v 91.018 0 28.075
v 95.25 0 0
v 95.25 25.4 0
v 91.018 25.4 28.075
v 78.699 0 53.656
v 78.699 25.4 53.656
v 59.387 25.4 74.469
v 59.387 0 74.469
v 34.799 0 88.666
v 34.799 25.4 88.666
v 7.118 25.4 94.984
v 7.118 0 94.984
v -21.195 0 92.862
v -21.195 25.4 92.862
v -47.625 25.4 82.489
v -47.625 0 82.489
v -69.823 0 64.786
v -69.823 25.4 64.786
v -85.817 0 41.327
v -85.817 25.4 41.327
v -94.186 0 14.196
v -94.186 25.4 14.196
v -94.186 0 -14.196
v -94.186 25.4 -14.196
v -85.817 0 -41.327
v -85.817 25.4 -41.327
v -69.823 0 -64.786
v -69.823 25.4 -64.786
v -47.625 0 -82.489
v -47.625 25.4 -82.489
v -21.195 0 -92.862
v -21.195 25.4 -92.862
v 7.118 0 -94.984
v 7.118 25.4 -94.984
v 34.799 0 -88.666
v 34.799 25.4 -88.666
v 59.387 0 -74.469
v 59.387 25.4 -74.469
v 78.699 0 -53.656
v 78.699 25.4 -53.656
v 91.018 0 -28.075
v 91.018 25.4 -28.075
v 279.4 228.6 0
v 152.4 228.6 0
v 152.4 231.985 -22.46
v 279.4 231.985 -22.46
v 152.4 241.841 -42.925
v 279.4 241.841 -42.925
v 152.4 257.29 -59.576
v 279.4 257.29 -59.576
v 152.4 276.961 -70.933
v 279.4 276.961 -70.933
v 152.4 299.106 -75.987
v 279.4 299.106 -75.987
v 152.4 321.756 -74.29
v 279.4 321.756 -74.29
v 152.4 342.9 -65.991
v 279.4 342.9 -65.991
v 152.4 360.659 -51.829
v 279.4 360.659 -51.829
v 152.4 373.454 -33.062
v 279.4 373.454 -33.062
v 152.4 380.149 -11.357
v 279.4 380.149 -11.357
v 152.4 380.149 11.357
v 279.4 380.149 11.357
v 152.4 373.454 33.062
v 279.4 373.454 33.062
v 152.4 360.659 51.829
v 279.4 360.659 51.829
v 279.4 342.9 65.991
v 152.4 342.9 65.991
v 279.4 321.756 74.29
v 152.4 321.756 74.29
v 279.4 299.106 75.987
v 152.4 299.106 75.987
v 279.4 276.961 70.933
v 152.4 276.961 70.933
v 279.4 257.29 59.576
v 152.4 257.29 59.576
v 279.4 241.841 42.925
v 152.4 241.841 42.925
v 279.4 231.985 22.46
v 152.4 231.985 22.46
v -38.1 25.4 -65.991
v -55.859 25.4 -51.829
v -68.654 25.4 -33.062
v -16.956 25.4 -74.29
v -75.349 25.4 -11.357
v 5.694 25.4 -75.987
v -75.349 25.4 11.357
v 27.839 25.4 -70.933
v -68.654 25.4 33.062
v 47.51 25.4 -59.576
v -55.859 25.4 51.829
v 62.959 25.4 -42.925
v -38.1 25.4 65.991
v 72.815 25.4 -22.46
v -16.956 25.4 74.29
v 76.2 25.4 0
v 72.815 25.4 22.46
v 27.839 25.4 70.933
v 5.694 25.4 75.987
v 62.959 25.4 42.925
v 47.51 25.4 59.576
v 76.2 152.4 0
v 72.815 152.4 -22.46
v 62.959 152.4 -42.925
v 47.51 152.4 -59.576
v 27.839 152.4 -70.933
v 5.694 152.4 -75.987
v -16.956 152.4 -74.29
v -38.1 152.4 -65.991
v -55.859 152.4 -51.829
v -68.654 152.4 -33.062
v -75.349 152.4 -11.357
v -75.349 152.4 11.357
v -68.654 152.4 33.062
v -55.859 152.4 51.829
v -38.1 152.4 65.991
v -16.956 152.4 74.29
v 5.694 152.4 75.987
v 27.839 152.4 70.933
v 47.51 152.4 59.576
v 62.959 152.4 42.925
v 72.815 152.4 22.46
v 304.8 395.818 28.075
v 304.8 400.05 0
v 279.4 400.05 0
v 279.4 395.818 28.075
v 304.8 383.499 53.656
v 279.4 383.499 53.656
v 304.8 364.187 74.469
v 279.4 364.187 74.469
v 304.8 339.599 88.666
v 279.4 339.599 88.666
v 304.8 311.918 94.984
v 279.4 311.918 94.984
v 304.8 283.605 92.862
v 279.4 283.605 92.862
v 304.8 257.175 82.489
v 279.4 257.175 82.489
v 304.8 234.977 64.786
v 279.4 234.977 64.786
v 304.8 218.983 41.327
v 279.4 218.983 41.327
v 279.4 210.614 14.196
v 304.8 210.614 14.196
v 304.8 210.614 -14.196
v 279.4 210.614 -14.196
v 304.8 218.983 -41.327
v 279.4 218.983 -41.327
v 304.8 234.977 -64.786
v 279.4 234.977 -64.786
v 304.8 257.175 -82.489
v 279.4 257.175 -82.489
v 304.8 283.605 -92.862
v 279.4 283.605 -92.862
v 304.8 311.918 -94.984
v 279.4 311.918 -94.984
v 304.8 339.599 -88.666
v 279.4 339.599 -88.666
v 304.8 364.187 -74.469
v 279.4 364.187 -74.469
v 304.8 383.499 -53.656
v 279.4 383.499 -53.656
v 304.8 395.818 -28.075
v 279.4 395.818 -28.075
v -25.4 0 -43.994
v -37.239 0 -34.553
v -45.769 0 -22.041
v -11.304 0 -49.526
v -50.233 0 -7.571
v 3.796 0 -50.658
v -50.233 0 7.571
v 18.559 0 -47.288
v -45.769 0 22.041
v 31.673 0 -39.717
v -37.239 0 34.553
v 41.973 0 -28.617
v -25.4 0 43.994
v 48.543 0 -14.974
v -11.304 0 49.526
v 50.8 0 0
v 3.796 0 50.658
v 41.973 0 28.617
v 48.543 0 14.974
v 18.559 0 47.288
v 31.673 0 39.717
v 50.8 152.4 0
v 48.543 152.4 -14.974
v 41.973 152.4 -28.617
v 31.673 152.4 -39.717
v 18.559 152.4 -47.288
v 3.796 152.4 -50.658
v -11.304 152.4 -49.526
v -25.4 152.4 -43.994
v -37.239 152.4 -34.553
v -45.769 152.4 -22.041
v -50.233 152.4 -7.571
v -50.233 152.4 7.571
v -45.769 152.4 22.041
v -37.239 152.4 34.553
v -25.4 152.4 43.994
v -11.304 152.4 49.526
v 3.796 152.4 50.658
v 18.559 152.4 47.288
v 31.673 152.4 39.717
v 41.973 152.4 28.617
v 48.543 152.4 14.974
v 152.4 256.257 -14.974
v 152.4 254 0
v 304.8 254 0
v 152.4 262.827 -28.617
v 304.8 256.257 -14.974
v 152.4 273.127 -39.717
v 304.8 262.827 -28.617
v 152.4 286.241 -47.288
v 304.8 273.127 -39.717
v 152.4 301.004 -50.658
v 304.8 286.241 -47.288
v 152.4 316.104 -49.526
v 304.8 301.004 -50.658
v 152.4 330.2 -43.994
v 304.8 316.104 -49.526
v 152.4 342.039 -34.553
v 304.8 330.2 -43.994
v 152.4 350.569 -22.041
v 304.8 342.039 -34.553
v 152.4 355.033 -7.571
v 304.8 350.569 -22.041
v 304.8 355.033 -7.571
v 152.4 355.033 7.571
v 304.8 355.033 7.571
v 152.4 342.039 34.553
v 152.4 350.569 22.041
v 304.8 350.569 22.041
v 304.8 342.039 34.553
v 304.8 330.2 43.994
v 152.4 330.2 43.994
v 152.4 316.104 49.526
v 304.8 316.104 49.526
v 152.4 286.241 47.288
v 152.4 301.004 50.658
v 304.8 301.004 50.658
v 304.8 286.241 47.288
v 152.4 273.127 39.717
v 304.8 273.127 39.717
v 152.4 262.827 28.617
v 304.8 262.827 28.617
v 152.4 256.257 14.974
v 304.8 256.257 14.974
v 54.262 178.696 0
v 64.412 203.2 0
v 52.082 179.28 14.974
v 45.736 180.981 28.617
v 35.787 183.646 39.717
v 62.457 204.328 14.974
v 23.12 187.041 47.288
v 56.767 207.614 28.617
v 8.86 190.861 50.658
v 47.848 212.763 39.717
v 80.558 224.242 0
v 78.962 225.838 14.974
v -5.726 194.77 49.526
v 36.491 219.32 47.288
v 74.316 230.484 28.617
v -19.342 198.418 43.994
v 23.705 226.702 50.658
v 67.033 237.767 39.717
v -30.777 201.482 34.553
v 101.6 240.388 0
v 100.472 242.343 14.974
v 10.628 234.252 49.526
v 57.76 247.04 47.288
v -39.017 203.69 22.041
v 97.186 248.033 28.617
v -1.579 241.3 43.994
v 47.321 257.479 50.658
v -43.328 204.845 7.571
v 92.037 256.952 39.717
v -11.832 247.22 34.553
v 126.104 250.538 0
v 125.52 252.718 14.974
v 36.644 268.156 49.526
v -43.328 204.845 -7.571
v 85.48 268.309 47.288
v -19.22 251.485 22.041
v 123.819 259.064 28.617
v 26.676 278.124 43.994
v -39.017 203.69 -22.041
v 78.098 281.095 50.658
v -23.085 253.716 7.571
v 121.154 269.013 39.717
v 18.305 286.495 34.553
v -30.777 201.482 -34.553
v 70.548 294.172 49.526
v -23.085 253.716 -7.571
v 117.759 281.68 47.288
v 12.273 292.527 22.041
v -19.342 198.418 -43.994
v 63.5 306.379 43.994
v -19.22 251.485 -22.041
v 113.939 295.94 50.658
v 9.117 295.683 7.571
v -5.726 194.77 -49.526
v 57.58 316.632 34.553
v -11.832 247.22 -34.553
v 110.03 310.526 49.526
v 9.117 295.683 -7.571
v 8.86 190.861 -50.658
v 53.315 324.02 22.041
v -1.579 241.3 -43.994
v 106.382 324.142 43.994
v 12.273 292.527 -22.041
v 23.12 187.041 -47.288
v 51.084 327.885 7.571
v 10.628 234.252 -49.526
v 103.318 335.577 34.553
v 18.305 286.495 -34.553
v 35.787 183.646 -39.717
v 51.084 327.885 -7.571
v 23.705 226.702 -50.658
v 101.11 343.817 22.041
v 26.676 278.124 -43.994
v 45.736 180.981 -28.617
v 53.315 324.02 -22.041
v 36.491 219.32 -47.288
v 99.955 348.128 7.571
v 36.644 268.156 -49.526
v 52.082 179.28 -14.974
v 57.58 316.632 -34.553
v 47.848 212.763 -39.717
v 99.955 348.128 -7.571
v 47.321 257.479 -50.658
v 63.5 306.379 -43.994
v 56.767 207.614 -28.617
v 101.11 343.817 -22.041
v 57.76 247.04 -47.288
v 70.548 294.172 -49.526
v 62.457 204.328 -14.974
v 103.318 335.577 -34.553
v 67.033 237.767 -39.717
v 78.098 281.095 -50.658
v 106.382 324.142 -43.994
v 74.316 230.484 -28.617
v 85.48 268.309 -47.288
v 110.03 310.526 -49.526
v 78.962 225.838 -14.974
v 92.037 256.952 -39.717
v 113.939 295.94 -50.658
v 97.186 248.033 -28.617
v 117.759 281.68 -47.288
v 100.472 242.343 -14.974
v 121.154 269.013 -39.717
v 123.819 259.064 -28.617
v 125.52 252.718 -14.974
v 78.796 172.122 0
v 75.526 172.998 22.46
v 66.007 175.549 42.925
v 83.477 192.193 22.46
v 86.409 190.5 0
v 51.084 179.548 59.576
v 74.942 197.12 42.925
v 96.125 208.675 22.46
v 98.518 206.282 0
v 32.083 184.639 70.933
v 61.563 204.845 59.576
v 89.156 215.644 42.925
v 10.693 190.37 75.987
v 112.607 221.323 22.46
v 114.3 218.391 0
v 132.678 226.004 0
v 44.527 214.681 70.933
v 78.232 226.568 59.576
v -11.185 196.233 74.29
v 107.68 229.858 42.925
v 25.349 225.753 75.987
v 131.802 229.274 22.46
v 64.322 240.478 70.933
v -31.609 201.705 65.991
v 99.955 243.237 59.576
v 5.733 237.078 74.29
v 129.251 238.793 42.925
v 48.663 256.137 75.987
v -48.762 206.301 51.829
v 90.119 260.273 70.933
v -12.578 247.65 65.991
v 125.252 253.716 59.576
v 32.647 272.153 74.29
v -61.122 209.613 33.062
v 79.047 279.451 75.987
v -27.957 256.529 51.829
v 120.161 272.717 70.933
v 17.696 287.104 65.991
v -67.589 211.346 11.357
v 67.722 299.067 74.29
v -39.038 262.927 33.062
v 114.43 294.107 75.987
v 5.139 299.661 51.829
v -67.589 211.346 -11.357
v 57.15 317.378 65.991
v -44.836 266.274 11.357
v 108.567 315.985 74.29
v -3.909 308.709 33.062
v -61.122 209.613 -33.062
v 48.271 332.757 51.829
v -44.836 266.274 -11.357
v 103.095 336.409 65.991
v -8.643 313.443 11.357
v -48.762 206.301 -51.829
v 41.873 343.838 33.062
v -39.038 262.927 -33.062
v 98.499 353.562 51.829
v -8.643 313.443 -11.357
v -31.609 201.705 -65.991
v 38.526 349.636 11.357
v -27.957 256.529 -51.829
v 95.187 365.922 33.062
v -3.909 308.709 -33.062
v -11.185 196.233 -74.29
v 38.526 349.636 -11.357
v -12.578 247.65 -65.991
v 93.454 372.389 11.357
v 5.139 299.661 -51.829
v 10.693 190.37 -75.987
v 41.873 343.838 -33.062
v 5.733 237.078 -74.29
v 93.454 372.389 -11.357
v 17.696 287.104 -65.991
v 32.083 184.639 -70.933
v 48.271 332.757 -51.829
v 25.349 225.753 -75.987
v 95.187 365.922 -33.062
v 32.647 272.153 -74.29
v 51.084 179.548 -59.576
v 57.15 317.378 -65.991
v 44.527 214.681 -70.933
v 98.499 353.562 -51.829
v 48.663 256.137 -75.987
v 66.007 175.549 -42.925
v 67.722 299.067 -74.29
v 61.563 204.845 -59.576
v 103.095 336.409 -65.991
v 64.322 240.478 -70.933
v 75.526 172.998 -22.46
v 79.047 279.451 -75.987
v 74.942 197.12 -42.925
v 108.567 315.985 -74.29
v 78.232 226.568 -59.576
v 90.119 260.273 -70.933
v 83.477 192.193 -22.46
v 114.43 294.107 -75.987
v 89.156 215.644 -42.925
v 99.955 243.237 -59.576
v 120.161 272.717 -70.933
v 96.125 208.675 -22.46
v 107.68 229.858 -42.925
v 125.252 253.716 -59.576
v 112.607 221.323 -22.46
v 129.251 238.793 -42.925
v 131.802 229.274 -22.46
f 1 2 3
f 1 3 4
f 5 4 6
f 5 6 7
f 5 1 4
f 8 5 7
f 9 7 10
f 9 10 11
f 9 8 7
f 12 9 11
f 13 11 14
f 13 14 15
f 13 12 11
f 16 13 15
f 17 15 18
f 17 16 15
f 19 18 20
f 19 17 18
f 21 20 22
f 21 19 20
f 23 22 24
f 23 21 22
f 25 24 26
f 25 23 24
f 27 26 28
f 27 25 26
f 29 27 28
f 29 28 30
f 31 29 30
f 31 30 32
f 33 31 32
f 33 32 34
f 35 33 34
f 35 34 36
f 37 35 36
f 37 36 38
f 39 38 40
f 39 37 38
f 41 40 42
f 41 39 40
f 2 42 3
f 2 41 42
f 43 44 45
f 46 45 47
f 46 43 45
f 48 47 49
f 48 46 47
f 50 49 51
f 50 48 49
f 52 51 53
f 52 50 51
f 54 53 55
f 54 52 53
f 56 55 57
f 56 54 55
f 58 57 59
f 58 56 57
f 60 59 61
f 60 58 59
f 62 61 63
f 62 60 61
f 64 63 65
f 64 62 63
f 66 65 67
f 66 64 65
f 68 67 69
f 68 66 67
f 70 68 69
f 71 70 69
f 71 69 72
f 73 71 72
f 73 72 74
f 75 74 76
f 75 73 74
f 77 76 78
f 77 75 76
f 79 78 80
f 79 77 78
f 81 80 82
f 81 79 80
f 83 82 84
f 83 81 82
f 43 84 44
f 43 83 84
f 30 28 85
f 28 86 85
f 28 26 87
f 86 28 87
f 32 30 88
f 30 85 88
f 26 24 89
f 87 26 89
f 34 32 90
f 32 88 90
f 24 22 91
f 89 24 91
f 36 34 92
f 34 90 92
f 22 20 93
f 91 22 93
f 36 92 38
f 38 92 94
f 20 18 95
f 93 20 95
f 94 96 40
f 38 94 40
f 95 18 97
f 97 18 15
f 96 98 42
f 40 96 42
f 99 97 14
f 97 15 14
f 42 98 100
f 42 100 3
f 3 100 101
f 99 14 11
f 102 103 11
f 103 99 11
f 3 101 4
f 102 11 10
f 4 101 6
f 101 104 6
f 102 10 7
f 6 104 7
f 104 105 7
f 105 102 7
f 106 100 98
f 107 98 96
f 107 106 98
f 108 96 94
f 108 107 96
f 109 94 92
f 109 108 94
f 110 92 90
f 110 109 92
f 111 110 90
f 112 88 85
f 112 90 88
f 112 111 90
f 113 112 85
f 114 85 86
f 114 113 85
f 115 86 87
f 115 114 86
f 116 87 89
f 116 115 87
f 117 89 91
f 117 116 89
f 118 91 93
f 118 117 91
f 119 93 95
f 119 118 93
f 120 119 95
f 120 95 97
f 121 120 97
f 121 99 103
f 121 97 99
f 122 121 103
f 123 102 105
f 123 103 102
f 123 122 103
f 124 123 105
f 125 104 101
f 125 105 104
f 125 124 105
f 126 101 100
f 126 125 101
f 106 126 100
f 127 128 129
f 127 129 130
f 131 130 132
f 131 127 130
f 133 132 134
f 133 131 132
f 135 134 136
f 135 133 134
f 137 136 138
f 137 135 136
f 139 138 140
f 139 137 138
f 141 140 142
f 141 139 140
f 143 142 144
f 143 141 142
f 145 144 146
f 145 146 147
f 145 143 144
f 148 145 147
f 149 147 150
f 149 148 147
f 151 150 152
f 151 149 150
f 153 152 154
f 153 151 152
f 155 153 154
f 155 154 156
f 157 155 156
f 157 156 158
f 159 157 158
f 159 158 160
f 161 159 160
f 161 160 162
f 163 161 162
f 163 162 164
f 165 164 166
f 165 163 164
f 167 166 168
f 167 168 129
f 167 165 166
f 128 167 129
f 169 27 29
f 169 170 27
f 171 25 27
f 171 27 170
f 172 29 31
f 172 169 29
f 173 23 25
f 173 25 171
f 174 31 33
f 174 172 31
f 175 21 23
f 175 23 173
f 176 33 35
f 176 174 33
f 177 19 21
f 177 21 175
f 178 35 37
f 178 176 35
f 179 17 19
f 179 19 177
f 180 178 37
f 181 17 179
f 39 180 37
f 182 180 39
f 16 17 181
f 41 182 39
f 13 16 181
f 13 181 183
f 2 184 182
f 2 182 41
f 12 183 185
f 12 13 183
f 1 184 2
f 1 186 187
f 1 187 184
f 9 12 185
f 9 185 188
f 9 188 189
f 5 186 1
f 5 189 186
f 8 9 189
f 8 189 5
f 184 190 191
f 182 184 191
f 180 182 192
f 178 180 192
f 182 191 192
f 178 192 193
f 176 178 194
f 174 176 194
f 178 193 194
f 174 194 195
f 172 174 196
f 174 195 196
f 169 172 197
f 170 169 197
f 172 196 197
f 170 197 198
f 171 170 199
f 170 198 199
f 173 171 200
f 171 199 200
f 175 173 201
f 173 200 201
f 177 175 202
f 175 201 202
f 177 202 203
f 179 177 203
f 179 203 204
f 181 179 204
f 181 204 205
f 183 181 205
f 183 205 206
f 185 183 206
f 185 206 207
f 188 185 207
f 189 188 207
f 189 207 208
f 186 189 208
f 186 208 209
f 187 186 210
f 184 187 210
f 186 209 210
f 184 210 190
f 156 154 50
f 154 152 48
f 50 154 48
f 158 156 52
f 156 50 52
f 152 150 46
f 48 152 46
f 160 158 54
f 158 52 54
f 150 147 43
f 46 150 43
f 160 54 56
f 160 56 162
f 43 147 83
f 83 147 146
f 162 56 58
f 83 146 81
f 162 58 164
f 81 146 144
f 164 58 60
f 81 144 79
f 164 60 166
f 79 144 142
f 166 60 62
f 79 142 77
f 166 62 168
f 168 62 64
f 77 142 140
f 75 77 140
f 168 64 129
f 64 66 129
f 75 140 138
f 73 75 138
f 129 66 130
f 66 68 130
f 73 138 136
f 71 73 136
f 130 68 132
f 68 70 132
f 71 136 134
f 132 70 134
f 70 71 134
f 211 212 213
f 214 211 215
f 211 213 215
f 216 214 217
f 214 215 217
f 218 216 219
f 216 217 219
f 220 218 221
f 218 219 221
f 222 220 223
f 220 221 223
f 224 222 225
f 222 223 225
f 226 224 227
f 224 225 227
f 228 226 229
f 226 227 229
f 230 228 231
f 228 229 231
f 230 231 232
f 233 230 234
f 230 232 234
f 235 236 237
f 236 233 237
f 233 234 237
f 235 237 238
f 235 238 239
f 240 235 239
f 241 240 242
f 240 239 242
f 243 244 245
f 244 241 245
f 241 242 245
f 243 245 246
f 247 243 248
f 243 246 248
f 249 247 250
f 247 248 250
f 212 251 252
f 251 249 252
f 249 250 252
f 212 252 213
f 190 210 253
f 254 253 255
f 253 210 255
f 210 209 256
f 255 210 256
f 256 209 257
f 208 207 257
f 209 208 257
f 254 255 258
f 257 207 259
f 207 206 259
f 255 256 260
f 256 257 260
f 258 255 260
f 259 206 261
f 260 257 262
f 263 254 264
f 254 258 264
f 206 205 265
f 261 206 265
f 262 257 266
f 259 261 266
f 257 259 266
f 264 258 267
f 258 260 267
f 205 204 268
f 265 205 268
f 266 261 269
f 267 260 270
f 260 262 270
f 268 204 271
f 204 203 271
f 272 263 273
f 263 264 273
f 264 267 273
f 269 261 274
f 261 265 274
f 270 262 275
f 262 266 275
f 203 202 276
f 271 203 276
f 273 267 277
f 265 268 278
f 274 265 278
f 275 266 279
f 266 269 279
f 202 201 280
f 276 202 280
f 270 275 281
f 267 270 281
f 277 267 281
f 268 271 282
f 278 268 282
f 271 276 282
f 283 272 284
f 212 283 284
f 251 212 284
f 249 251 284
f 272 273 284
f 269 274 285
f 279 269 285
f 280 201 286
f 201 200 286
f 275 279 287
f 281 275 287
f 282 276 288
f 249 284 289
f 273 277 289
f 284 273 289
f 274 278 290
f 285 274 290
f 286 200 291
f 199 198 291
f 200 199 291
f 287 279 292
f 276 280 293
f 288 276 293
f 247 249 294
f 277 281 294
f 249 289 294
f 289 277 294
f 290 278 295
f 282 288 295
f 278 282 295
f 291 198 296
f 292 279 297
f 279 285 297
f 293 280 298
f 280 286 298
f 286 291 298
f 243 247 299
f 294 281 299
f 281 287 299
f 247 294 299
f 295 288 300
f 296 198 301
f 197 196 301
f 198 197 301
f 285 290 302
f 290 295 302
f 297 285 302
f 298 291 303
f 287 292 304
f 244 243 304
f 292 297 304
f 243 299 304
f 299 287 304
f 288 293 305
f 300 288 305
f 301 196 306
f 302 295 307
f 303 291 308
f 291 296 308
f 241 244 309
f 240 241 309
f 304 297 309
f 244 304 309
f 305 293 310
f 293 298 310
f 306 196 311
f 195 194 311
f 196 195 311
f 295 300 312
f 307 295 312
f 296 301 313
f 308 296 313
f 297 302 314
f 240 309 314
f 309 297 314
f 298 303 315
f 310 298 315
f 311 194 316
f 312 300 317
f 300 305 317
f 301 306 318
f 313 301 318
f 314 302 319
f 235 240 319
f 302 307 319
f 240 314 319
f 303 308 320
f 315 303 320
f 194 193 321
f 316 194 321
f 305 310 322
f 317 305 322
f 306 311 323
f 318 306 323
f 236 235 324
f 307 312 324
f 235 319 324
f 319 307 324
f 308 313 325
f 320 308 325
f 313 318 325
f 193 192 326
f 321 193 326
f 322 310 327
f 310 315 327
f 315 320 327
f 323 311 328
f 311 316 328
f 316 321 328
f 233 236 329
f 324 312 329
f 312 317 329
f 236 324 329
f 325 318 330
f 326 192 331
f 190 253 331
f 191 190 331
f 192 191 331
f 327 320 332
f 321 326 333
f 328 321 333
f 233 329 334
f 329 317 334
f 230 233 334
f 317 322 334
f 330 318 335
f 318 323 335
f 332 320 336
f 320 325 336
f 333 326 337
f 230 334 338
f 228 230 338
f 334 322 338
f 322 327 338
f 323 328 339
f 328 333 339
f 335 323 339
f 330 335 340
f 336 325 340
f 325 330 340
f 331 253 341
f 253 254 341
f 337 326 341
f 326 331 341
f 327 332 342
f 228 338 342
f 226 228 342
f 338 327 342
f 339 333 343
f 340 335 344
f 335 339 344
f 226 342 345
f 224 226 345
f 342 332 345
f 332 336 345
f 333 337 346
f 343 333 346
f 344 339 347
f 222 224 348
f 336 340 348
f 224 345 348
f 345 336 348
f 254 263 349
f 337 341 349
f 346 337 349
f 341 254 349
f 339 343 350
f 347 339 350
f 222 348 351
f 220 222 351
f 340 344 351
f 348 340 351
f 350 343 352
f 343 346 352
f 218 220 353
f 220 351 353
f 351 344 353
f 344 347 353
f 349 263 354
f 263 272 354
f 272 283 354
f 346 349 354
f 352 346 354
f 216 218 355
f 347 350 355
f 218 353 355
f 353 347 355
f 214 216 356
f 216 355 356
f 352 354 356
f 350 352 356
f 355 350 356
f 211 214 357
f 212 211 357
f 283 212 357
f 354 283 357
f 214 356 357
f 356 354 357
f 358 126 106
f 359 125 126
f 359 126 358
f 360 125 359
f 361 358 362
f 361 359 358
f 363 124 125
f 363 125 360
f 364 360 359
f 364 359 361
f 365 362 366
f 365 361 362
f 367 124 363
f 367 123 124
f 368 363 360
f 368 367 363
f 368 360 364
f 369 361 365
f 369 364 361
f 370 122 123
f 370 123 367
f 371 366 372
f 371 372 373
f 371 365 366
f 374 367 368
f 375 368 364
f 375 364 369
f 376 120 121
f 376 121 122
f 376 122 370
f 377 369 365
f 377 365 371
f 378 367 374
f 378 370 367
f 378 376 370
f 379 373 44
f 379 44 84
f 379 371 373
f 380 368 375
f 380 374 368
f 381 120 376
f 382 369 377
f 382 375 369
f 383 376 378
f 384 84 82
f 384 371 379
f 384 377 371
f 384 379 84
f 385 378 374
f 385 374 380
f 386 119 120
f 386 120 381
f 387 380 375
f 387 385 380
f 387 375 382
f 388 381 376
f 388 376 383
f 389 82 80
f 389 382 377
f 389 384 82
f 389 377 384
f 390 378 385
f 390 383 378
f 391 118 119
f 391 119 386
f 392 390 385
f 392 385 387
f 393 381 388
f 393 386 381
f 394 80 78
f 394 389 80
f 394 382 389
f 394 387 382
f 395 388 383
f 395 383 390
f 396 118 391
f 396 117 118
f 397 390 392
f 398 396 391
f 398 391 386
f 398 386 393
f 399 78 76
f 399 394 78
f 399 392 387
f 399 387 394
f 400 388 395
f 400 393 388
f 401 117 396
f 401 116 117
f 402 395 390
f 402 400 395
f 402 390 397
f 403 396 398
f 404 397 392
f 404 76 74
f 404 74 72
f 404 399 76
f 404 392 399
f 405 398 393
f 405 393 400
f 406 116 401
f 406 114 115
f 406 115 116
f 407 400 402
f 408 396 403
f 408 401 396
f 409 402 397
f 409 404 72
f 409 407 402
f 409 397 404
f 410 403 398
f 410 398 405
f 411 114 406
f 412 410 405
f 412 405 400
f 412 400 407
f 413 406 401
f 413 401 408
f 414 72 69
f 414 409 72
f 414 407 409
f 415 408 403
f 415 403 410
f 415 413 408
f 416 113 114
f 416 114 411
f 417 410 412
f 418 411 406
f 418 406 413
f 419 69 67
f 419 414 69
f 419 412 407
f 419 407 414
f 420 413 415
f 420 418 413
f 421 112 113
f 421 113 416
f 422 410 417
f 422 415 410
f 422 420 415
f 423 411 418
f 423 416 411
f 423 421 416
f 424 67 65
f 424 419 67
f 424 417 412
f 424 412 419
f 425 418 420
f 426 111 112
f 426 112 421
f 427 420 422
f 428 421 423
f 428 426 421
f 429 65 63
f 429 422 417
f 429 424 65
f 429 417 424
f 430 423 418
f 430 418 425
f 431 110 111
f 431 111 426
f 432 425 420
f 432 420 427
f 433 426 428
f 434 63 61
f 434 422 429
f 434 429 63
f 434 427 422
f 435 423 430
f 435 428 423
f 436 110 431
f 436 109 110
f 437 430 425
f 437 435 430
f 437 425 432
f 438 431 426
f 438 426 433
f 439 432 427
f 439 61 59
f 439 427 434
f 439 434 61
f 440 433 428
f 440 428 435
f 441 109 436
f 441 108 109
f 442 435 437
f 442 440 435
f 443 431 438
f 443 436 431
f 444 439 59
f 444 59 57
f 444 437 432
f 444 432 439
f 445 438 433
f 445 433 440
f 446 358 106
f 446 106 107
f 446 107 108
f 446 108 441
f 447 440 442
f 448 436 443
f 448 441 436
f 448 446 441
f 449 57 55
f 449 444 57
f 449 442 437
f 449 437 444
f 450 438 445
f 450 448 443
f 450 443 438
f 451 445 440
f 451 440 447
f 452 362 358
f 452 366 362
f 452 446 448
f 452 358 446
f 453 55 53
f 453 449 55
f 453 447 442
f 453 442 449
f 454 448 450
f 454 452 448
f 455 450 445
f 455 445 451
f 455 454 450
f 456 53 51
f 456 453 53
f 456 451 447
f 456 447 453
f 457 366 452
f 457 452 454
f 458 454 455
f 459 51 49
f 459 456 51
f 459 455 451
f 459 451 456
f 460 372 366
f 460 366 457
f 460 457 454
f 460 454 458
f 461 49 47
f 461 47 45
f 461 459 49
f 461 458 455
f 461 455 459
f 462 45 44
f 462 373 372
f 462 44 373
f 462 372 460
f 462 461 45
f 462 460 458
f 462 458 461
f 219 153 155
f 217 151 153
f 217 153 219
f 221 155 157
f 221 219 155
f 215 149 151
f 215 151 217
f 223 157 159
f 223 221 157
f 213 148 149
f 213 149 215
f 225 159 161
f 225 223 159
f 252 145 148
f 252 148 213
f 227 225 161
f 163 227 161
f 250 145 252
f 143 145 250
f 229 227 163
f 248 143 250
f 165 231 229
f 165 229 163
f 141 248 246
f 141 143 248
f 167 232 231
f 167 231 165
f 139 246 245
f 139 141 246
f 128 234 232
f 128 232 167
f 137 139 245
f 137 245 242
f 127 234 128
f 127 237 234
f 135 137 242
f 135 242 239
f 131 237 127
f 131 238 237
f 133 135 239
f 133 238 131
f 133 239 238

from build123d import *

# Parameters (mm, degrees)
F0_R     = 76.2
F3_T     = -25.4
F0_R_2   = 95.25
F4_DEPTH = 25.4
F6_R     = 95.25
F6_R_2   = 76.2
F7_DEPTH = 25.4


with BuildPart() as f2:
    # F2: sweep along a path in F1
    with BuildLine(Plane.XY) as f2_path:
        Line((0, 0), (0, 152.4))
        ThreePointArc((0, 152.4), (44.6369265472, 260.1630734528), (152.4, 304.8))
        Line((152.4, 304.8), (304.8, 304.8))
    # F0 (on Front) → F2 (sweep)
    with BuildSketch(Plane.XZ):
        Circle(F0_R)
    sweep(path=f2_path.line)

    # F3
    f3_openings = [f2.faces().sort_by_distance(p)[0] for p in [
        (0, 0, 0),
        (304.8, 304.8, 0),
    ]]
    offset(amount=F3_T, openings=f3_openings)

    # F0 (on Front) → F4 (join)
    with BuildSketch(Plane.XZ):
        Circle(F0_R_2)
        Circle(F0_R, mode=Mode.SUBTRACT)
    extrude(amount=-F4_DEPTH)

    # F6 (on line) → F7 (join)
    with BuildSketch(Plane.YZ.offset(304.8)):
        with Locations((304.8, 0)):
            Circle(F6_R)
        with Locations((304.8, 0)):
            Circle(F6_R_2, mode=Mode.SUBTRACT)
    extrude(amount=-F7_DEPTH)


solid = f2.part
